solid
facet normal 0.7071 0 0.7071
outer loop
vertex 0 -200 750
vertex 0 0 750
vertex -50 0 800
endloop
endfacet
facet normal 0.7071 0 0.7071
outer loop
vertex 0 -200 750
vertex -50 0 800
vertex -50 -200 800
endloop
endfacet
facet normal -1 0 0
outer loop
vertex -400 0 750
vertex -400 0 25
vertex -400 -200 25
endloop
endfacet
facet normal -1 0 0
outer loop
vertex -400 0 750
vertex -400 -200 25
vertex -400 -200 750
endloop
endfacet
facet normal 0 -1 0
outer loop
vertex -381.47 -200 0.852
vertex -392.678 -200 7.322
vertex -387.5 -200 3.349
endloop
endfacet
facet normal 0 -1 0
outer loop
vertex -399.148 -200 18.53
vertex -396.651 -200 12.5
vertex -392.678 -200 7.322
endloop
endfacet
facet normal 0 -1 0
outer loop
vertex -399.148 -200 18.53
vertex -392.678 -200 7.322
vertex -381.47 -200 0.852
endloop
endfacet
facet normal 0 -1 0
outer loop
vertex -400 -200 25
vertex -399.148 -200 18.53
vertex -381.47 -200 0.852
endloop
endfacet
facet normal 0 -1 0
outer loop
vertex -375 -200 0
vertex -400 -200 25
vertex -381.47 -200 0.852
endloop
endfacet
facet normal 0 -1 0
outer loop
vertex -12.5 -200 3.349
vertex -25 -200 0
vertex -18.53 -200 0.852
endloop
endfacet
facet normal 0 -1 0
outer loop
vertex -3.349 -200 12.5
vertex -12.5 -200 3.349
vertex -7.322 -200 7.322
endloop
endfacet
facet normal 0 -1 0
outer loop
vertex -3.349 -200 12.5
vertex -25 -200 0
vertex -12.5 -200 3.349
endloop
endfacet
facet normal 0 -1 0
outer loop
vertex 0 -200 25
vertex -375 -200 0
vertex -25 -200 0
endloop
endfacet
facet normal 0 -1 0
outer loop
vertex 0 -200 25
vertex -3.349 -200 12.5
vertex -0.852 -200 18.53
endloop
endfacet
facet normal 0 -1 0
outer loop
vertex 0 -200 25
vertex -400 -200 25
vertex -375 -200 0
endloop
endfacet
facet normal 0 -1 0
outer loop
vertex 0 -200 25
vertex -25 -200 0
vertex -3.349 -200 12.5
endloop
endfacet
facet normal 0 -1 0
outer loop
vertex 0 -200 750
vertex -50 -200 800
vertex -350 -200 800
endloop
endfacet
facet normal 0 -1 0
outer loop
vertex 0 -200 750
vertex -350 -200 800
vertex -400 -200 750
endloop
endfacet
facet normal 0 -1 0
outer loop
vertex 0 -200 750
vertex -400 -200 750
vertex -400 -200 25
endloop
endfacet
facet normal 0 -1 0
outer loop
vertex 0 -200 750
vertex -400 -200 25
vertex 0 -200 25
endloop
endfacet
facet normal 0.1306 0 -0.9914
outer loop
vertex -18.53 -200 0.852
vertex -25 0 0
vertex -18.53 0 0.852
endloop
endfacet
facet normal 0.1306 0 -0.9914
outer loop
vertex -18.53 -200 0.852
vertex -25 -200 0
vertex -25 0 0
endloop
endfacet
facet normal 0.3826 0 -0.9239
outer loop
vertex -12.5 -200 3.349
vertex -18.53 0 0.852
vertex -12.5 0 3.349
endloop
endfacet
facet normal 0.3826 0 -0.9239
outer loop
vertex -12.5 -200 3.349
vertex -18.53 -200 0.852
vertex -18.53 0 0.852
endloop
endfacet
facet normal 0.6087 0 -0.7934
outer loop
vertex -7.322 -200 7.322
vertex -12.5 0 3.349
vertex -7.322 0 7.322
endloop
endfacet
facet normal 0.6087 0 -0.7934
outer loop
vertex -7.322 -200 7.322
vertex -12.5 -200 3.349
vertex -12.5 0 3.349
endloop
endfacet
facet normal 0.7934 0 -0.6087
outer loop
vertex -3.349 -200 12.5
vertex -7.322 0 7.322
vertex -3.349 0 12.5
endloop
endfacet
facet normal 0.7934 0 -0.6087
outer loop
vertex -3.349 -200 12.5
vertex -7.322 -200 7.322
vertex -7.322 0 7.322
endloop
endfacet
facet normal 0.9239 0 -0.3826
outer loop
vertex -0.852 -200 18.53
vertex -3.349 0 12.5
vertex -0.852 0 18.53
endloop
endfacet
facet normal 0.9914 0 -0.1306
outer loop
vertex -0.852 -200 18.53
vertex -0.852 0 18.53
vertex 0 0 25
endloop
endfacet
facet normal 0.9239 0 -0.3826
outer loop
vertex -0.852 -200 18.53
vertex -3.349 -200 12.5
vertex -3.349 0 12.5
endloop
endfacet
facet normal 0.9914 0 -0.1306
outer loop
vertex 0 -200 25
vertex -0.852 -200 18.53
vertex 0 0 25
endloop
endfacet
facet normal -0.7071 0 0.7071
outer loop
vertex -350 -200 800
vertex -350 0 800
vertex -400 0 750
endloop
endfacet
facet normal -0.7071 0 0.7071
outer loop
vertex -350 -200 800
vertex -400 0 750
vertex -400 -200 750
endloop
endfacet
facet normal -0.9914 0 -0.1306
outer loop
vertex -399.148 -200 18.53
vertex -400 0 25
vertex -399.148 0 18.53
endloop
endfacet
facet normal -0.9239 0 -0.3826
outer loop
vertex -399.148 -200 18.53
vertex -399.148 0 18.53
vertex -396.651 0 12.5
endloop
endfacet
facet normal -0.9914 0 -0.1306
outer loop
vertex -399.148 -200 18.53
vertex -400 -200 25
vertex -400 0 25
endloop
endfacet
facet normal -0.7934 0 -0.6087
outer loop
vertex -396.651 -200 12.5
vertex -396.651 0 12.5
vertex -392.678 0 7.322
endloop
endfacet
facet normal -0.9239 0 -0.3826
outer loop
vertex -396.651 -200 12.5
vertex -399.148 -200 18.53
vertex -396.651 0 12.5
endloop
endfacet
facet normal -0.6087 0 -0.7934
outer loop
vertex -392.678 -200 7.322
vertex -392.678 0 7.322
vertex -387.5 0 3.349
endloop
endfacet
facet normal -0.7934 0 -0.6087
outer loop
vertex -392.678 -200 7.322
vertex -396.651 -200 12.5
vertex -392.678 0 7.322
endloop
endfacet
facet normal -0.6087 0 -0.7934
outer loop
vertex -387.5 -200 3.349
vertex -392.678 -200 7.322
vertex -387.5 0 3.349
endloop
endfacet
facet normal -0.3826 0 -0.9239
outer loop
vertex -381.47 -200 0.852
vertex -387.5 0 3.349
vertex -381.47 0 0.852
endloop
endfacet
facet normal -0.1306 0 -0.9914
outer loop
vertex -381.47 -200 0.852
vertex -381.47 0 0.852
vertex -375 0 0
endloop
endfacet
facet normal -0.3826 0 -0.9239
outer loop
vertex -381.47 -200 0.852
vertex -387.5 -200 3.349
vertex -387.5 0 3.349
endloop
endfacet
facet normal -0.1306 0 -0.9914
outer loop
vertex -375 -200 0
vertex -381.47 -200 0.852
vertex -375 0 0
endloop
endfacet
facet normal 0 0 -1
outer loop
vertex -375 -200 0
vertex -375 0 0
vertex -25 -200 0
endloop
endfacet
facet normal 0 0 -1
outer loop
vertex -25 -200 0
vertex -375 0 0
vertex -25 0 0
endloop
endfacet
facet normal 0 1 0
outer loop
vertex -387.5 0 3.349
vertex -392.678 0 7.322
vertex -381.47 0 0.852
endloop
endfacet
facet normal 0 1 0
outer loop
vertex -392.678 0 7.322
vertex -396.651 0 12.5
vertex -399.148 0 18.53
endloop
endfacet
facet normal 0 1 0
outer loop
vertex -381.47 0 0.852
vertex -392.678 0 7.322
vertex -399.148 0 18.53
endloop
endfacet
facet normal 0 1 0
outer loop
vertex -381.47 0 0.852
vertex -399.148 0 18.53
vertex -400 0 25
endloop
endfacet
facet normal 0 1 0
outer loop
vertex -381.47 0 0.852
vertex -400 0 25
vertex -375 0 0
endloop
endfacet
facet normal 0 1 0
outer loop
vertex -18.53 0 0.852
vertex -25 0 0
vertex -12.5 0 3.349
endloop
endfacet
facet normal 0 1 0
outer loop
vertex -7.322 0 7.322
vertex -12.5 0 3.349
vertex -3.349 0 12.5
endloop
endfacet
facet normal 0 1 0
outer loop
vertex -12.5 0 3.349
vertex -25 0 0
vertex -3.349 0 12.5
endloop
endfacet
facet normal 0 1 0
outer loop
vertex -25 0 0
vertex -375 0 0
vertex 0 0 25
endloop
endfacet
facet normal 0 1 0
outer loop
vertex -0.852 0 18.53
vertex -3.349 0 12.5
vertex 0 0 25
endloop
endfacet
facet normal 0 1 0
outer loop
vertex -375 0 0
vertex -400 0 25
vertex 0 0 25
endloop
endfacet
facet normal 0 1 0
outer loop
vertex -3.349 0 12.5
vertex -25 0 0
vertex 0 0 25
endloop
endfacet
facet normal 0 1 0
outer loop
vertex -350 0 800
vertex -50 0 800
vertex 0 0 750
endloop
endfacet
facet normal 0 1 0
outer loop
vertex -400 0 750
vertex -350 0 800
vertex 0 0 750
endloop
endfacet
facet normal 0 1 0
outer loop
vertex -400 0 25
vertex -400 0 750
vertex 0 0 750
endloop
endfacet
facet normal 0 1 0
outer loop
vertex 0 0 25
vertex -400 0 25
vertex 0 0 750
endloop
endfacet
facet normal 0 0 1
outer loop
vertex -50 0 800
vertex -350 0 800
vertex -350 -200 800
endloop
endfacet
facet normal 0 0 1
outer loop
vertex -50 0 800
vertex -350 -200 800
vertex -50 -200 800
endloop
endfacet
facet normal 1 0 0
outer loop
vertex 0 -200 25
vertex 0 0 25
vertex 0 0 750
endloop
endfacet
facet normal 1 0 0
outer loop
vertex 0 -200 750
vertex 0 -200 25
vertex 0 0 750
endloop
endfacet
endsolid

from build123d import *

# Parameters (mm, degrees)
F0_W     = 400
F0_H     = 800
F1_DEPTH = 200
F2_R     = 25
F3_SIZE  = 50
F4_SIZE  = 50


with BuildPart() as f1:
    # F0 (on Front) → F1 (new body)
    with BuildSketch(Plane.XZ):
        with Locations((-200, 400)):
            Rectangle(F0_W, F0_H)
    extrude(amount=F1_DEPTH)

    # F2
    f2_edges = [f1.edges().sort_by_distance(p)[0] for p in [
        (0, -100, 0),
        (-400, -100, 0),
    ]]
    fillet(f2_edges, radius=F2_R)

    # F3
    f3_edges = [f1.edges().sort_by_distance(p)[0] for p in [
        (-400, -100, 800),
    ]]
    chamfer(f3_edges, length=F3_SIZE)

    # F4
    f4_edges = [f1.edges().sort_by_distance(p)[0] for p in [
        (0, -100, 800),
    ]]
    chamfer(f4_edges, length=F4_SIZE)


solid = f1.part
